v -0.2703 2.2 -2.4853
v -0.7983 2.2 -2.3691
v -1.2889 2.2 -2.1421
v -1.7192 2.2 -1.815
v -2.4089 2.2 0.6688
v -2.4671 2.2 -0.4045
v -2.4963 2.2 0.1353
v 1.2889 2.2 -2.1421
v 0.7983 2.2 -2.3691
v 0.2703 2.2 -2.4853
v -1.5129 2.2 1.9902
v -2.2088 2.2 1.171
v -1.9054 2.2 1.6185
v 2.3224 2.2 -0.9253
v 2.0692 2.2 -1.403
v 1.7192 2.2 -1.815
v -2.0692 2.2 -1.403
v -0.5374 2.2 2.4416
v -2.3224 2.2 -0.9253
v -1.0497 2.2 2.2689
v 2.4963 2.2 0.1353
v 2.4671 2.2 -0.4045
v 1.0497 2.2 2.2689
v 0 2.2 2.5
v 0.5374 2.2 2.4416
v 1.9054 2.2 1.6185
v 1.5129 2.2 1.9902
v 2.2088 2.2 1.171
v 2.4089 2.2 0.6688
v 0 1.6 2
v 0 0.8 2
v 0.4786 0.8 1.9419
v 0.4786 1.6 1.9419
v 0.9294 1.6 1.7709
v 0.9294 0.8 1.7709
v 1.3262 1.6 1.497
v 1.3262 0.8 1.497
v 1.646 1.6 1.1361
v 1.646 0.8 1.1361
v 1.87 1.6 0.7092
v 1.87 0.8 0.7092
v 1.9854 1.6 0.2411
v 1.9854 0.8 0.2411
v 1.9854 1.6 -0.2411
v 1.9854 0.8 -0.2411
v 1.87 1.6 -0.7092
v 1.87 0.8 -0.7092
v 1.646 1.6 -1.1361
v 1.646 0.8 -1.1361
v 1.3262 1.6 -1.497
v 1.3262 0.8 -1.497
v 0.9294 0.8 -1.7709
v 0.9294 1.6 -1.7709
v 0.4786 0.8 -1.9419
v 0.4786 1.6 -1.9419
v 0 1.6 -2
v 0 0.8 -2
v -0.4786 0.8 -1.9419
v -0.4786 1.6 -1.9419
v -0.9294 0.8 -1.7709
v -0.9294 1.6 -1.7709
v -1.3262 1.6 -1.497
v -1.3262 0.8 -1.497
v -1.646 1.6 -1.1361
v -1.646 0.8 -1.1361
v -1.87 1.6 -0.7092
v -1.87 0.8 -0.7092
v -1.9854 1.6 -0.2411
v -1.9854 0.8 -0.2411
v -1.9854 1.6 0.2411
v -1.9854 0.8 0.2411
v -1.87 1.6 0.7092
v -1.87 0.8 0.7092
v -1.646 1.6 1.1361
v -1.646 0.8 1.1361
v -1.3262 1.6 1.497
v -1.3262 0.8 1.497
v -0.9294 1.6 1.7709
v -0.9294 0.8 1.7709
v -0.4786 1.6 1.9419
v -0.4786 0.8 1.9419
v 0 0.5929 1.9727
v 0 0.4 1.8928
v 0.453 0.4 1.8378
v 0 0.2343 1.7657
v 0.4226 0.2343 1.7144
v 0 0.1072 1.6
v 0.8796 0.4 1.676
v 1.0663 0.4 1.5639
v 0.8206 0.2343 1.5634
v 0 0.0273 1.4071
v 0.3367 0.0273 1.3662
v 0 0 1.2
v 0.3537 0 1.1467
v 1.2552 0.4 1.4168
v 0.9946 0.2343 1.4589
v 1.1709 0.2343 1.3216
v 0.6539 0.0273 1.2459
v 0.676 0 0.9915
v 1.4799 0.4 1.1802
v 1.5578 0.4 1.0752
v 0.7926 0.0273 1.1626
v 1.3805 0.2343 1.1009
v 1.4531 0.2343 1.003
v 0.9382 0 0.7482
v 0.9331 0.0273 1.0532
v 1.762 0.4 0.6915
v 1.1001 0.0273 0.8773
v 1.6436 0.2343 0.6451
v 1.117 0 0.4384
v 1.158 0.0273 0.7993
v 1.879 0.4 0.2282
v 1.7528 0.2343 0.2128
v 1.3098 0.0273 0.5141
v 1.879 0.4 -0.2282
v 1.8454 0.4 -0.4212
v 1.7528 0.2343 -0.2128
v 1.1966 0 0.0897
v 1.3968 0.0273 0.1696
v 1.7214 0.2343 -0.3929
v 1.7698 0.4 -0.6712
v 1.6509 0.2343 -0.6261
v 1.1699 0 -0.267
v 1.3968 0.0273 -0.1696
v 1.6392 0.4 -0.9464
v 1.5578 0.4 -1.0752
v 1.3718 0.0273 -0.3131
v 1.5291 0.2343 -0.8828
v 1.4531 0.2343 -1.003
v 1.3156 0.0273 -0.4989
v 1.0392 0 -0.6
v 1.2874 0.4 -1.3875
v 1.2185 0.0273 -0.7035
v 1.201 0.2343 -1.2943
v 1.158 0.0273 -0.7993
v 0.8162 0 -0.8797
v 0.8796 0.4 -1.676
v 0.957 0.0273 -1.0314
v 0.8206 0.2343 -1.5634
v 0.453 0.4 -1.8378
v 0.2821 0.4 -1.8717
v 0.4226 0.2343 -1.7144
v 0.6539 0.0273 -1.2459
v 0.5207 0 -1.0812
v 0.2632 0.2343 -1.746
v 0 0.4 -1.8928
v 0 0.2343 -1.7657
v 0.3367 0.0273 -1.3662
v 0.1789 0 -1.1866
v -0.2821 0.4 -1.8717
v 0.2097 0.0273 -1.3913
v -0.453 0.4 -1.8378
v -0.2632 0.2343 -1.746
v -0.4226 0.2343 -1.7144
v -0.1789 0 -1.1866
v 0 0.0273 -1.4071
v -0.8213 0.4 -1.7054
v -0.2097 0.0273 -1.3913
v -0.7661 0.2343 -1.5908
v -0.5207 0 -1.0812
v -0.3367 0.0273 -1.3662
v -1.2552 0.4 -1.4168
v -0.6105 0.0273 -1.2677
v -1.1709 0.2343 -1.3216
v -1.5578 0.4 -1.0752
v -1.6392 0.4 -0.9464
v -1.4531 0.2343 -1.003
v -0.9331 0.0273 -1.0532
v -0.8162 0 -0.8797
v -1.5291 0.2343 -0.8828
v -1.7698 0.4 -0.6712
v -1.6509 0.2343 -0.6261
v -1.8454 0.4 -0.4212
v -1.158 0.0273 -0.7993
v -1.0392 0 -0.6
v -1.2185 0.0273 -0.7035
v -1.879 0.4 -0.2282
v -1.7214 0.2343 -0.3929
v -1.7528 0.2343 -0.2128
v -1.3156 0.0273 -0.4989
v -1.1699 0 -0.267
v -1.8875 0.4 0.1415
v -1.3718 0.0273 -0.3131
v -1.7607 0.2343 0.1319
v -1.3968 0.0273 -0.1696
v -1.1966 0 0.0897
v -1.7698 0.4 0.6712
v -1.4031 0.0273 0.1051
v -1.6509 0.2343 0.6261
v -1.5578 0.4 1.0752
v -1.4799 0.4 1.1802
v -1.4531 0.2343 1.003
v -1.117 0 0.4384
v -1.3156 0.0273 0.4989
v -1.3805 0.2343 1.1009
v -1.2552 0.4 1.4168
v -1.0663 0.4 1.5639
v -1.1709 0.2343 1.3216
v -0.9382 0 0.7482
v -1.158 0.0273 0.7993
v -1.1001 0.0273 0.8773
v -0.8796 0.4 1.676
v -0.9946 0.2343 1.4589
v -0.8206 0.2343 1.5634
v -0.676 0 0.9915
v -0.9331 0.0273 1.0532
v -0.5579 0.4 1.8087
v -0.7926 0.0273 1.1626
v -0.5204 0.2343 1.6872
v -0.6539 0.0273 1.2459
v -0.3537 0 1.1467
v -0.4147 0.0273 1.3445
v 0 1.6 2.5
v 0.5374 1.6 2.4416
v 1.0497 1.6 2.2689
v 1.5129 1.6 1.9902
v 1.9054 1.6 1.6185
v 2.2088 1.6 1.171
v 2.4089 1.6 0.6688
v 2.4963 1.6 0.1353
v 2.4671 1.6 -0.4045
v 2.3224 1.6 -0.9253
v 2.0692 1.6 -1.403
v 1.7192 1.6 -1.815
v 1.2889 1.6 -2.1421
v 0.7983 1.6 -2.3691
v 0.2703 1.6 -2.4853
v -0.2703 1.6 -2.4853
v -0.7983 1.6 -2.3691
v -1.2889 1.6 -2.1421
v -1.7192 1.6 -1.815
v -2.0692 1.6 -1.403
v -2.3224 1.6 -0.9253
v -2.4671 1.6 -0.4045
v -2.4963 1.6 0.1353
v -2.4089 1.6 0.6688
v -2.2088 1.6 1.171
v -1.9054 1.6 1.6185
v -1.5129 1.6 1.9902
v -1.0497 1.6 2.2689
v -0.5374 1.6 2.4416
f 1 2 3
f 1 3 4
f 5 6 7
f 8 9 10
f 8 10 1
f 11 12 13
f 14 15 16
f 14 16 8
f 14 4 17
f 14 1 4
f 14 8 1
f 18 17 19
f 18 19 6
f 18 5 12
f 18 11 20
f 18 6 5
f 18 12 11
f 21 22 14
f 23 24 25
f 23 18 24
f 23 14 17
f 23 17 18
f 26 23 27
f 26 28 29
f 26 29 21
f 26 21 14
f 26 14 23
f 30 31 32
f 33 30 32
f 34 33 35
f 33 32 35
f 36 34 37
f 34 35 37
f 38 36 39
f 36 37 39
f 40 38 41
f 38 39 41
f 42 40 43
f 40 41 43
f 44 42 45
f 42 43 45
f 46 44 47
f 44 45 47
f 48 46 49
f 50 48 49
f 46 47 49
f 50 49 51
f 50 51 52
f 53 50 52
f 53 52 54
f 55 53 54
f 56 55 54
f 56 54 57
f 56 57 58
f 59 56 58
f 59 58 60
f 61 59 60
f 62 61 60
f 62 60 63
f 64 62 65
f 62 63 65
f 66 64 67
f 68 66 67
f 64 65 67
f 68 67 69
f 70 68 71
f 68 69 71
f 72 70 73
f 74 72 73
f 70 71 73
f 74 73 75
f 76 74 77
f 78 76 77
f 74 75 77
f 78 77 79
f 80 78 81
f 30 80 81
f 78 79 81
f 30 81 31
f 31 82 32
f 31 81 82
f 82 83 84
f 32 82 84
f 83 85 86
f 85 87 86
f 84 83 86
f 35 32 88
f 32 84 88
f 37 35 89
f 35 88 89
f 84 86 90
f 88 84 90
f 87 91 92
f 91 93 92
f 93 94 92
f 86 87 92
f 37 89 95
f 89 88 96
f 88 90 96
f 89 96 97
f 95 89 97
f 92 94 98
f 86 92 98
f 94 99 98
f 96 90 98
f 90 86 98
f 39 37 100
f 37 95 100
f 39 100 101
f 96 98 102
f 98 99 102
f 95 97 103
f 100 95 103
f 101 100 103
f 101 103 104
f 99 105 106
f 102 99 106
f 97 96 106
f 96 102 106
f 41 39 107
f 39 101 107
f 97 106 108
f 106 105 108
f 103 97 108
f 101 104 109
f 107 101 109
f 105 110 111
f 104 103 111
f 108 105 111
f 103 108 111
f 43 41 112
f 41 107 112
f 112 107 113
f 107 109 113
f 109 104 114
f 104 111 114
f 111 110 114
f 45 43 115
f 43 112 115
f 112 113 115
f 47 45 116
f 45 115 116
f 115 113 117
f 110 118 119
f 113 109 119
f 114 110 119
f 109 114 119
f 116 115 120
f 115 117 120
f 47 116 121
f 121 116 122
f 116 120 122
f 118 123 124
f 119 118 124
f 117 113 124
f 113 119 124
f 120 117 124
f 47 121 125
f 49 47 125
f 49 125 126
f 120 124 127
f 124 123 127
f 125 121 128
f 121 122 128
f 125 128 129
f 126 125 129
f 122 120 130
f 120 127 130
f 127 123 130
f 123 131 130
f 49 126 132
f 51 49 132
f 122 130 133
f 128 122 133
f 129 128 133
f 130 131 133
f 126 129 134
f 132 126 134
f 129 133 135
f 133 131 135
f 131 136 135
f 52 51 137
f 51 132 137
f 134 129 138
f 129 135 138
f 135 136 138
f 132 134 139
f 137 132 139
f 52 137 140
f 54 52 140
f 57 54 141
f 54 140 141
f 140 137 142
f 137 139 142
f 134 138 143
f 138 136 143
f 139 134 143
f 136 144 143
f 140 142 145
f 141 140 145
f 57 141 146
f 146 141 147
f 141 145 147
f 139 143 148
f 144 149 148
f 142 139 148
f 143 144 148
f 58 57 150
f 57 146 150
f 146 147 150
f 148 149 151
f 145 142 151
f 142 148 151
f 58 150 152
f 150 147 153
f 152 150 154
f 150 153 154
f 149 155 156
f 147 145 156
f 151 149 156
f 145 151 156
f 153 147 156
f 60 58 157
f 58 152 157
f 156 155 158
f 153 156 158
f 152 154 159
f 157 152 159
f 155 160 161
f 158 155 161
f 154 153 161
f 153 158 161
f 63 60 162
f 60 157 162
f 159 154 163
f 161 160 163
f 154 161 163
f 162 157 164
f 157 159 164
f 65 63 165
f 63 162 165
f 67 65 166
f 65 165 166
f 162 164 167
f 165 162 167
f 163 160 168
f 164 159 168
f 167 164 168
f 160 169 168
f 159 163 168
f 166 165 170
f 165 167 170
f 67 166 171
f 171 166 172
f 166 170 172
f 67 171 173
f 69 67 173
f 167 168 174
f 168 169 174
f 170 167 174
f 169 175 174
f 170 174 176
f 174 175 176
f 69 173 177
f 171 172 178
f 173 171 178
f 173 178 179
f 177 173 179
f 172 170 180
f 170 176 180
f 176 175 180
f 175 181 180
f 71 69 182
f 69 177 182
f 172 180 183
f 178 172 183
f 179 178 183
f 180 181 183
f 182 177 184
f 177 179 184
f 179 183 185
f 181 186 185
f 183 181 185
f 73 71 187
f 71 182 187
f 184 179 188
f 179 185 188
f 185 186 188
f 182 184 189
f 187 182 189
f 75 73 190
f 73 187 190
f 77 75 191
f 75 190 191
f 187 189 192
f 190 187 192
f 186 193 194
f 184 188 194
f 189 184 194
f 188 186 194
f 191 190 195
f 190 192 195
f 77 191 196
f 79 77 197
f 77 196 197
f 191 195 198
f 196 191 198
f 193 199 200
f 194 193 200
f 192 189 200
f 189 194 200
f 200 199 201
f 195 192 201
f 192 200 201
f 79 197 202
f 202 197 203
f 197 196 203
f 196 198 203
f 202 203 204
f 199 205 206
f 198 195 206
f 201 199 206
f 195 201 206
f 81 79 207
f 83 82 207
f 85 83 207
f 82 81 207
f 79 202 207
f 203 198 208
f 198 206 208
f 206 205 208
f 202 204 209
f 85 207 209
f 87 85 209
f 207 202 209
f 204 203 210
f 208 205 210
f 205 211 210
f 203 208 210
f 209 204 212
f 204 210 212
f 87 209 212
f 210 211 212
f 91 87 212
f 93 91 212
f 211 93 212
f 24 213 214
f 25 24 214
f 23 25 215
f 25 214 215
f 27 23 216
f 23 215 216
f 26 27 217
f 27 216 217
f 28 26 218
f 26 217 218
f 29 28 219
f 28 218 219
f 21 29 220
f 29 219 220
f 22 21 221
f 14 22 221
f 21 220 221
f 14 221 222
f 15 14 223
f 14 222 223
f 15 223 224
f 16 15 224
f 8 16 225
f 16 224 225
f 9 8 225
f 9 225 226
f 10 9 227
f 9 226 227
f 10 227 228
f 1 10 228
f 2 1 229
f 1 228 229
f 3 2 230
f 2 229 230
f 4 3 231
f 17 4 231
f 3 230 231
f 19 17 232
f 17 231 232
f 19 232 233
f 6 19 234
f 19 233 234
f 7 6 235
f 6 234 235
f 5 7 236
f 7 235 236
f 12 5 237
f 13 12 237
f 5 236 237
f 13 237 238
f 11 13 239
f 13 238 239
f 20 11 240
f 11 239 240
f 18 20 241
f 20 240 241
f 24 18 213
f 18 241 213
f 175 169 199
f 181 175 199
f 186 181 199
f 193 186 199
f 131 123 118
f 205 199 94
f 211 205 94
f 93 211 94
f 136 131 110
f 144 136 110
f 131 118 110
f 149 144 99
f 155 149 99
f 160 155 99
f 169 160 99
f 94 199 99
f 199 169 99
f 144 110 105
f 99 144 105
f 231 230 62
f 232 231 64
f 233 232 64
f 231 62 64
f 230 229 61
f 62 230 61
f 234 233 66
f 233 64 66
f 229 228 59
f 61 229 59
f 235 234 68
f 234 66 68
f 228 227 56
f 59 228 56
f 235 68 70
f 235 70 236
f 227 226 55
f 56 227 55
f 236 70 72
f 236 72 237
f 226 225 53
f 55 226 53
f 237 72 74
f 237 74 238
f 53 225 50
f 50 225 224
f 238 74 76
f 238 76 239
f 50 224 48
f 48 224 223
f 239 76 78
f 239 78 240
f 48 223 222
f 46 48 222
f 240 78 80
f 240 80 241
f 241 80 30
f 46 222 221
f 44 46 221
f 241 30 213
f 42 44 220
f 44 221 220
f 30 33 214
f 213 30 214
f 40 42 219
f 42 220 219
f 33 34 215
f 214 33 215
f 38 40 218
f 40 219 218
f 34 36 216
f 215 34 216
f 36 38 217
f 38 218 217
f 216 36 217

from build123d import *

# Parameters (mm, degrees)
SKETCH_1_R      = 2
EXTRUDE_1_DEPTH = 1.6
SKETCH_2_R      = 2.5
SKETCH_2_R_2    = 2
EXTRUDE_2_DEPTH = 0.6
FILLET_1_R      = 0.8


with BuildPart() as part:
    # Эскиз1 → Бобышка-Вытянуть1 (new body)
    with BuildSketch(Plane(origin=(0, 0, 0), x_dir=(1, 0, 0), z_dir=(0, 1, 0))):
        with Locations(Location((0, 0, 0), (0, 0, 270))):
            Circle(SKETCH_1_R)
    extrude(amount=EXTRUDE_1_DEPTH)

    # Эскиз2 → Бобышка-Вытянуть2 (add)
    # profile 1 of 2: a face of its own
    with BuildSketch(Plane(origin=(0, 1.6, 0), x_dir=(1, 0, 0), z_dir=(0, 1, 0))):
        with Locations(Location((0, 0, 0), (0, 0, 270))):
            Circle(SKETCH_2_R)
        with Locations(Location((0, 0, 0), (0, 0, 270))):
            Circle(SKETCH_2_R_2, mode=Mode.SUBTRACT)
    # profile 2 of 2: a face of its own
    with BuildSketch(Plane(origin=(0, 1.6, 0), x_dir=(1, 0, 0), z_dir=(0, 1, 0))):
        with Locations(Location((0, 0, 0), (0, 0, 270))):
            Circle(SKETCH_2_R_2)
    extrude(amount=EXTRUDE_2_DEPTH)

    # Скругление1
    fillet_1_edges = [part.edges().sort_by_distance(p)[0] for p in [
        (0, 0, -2),
    ]]
    fillet(fillet_1_edges, radius=FILLET_1_R)


solid = part.part
